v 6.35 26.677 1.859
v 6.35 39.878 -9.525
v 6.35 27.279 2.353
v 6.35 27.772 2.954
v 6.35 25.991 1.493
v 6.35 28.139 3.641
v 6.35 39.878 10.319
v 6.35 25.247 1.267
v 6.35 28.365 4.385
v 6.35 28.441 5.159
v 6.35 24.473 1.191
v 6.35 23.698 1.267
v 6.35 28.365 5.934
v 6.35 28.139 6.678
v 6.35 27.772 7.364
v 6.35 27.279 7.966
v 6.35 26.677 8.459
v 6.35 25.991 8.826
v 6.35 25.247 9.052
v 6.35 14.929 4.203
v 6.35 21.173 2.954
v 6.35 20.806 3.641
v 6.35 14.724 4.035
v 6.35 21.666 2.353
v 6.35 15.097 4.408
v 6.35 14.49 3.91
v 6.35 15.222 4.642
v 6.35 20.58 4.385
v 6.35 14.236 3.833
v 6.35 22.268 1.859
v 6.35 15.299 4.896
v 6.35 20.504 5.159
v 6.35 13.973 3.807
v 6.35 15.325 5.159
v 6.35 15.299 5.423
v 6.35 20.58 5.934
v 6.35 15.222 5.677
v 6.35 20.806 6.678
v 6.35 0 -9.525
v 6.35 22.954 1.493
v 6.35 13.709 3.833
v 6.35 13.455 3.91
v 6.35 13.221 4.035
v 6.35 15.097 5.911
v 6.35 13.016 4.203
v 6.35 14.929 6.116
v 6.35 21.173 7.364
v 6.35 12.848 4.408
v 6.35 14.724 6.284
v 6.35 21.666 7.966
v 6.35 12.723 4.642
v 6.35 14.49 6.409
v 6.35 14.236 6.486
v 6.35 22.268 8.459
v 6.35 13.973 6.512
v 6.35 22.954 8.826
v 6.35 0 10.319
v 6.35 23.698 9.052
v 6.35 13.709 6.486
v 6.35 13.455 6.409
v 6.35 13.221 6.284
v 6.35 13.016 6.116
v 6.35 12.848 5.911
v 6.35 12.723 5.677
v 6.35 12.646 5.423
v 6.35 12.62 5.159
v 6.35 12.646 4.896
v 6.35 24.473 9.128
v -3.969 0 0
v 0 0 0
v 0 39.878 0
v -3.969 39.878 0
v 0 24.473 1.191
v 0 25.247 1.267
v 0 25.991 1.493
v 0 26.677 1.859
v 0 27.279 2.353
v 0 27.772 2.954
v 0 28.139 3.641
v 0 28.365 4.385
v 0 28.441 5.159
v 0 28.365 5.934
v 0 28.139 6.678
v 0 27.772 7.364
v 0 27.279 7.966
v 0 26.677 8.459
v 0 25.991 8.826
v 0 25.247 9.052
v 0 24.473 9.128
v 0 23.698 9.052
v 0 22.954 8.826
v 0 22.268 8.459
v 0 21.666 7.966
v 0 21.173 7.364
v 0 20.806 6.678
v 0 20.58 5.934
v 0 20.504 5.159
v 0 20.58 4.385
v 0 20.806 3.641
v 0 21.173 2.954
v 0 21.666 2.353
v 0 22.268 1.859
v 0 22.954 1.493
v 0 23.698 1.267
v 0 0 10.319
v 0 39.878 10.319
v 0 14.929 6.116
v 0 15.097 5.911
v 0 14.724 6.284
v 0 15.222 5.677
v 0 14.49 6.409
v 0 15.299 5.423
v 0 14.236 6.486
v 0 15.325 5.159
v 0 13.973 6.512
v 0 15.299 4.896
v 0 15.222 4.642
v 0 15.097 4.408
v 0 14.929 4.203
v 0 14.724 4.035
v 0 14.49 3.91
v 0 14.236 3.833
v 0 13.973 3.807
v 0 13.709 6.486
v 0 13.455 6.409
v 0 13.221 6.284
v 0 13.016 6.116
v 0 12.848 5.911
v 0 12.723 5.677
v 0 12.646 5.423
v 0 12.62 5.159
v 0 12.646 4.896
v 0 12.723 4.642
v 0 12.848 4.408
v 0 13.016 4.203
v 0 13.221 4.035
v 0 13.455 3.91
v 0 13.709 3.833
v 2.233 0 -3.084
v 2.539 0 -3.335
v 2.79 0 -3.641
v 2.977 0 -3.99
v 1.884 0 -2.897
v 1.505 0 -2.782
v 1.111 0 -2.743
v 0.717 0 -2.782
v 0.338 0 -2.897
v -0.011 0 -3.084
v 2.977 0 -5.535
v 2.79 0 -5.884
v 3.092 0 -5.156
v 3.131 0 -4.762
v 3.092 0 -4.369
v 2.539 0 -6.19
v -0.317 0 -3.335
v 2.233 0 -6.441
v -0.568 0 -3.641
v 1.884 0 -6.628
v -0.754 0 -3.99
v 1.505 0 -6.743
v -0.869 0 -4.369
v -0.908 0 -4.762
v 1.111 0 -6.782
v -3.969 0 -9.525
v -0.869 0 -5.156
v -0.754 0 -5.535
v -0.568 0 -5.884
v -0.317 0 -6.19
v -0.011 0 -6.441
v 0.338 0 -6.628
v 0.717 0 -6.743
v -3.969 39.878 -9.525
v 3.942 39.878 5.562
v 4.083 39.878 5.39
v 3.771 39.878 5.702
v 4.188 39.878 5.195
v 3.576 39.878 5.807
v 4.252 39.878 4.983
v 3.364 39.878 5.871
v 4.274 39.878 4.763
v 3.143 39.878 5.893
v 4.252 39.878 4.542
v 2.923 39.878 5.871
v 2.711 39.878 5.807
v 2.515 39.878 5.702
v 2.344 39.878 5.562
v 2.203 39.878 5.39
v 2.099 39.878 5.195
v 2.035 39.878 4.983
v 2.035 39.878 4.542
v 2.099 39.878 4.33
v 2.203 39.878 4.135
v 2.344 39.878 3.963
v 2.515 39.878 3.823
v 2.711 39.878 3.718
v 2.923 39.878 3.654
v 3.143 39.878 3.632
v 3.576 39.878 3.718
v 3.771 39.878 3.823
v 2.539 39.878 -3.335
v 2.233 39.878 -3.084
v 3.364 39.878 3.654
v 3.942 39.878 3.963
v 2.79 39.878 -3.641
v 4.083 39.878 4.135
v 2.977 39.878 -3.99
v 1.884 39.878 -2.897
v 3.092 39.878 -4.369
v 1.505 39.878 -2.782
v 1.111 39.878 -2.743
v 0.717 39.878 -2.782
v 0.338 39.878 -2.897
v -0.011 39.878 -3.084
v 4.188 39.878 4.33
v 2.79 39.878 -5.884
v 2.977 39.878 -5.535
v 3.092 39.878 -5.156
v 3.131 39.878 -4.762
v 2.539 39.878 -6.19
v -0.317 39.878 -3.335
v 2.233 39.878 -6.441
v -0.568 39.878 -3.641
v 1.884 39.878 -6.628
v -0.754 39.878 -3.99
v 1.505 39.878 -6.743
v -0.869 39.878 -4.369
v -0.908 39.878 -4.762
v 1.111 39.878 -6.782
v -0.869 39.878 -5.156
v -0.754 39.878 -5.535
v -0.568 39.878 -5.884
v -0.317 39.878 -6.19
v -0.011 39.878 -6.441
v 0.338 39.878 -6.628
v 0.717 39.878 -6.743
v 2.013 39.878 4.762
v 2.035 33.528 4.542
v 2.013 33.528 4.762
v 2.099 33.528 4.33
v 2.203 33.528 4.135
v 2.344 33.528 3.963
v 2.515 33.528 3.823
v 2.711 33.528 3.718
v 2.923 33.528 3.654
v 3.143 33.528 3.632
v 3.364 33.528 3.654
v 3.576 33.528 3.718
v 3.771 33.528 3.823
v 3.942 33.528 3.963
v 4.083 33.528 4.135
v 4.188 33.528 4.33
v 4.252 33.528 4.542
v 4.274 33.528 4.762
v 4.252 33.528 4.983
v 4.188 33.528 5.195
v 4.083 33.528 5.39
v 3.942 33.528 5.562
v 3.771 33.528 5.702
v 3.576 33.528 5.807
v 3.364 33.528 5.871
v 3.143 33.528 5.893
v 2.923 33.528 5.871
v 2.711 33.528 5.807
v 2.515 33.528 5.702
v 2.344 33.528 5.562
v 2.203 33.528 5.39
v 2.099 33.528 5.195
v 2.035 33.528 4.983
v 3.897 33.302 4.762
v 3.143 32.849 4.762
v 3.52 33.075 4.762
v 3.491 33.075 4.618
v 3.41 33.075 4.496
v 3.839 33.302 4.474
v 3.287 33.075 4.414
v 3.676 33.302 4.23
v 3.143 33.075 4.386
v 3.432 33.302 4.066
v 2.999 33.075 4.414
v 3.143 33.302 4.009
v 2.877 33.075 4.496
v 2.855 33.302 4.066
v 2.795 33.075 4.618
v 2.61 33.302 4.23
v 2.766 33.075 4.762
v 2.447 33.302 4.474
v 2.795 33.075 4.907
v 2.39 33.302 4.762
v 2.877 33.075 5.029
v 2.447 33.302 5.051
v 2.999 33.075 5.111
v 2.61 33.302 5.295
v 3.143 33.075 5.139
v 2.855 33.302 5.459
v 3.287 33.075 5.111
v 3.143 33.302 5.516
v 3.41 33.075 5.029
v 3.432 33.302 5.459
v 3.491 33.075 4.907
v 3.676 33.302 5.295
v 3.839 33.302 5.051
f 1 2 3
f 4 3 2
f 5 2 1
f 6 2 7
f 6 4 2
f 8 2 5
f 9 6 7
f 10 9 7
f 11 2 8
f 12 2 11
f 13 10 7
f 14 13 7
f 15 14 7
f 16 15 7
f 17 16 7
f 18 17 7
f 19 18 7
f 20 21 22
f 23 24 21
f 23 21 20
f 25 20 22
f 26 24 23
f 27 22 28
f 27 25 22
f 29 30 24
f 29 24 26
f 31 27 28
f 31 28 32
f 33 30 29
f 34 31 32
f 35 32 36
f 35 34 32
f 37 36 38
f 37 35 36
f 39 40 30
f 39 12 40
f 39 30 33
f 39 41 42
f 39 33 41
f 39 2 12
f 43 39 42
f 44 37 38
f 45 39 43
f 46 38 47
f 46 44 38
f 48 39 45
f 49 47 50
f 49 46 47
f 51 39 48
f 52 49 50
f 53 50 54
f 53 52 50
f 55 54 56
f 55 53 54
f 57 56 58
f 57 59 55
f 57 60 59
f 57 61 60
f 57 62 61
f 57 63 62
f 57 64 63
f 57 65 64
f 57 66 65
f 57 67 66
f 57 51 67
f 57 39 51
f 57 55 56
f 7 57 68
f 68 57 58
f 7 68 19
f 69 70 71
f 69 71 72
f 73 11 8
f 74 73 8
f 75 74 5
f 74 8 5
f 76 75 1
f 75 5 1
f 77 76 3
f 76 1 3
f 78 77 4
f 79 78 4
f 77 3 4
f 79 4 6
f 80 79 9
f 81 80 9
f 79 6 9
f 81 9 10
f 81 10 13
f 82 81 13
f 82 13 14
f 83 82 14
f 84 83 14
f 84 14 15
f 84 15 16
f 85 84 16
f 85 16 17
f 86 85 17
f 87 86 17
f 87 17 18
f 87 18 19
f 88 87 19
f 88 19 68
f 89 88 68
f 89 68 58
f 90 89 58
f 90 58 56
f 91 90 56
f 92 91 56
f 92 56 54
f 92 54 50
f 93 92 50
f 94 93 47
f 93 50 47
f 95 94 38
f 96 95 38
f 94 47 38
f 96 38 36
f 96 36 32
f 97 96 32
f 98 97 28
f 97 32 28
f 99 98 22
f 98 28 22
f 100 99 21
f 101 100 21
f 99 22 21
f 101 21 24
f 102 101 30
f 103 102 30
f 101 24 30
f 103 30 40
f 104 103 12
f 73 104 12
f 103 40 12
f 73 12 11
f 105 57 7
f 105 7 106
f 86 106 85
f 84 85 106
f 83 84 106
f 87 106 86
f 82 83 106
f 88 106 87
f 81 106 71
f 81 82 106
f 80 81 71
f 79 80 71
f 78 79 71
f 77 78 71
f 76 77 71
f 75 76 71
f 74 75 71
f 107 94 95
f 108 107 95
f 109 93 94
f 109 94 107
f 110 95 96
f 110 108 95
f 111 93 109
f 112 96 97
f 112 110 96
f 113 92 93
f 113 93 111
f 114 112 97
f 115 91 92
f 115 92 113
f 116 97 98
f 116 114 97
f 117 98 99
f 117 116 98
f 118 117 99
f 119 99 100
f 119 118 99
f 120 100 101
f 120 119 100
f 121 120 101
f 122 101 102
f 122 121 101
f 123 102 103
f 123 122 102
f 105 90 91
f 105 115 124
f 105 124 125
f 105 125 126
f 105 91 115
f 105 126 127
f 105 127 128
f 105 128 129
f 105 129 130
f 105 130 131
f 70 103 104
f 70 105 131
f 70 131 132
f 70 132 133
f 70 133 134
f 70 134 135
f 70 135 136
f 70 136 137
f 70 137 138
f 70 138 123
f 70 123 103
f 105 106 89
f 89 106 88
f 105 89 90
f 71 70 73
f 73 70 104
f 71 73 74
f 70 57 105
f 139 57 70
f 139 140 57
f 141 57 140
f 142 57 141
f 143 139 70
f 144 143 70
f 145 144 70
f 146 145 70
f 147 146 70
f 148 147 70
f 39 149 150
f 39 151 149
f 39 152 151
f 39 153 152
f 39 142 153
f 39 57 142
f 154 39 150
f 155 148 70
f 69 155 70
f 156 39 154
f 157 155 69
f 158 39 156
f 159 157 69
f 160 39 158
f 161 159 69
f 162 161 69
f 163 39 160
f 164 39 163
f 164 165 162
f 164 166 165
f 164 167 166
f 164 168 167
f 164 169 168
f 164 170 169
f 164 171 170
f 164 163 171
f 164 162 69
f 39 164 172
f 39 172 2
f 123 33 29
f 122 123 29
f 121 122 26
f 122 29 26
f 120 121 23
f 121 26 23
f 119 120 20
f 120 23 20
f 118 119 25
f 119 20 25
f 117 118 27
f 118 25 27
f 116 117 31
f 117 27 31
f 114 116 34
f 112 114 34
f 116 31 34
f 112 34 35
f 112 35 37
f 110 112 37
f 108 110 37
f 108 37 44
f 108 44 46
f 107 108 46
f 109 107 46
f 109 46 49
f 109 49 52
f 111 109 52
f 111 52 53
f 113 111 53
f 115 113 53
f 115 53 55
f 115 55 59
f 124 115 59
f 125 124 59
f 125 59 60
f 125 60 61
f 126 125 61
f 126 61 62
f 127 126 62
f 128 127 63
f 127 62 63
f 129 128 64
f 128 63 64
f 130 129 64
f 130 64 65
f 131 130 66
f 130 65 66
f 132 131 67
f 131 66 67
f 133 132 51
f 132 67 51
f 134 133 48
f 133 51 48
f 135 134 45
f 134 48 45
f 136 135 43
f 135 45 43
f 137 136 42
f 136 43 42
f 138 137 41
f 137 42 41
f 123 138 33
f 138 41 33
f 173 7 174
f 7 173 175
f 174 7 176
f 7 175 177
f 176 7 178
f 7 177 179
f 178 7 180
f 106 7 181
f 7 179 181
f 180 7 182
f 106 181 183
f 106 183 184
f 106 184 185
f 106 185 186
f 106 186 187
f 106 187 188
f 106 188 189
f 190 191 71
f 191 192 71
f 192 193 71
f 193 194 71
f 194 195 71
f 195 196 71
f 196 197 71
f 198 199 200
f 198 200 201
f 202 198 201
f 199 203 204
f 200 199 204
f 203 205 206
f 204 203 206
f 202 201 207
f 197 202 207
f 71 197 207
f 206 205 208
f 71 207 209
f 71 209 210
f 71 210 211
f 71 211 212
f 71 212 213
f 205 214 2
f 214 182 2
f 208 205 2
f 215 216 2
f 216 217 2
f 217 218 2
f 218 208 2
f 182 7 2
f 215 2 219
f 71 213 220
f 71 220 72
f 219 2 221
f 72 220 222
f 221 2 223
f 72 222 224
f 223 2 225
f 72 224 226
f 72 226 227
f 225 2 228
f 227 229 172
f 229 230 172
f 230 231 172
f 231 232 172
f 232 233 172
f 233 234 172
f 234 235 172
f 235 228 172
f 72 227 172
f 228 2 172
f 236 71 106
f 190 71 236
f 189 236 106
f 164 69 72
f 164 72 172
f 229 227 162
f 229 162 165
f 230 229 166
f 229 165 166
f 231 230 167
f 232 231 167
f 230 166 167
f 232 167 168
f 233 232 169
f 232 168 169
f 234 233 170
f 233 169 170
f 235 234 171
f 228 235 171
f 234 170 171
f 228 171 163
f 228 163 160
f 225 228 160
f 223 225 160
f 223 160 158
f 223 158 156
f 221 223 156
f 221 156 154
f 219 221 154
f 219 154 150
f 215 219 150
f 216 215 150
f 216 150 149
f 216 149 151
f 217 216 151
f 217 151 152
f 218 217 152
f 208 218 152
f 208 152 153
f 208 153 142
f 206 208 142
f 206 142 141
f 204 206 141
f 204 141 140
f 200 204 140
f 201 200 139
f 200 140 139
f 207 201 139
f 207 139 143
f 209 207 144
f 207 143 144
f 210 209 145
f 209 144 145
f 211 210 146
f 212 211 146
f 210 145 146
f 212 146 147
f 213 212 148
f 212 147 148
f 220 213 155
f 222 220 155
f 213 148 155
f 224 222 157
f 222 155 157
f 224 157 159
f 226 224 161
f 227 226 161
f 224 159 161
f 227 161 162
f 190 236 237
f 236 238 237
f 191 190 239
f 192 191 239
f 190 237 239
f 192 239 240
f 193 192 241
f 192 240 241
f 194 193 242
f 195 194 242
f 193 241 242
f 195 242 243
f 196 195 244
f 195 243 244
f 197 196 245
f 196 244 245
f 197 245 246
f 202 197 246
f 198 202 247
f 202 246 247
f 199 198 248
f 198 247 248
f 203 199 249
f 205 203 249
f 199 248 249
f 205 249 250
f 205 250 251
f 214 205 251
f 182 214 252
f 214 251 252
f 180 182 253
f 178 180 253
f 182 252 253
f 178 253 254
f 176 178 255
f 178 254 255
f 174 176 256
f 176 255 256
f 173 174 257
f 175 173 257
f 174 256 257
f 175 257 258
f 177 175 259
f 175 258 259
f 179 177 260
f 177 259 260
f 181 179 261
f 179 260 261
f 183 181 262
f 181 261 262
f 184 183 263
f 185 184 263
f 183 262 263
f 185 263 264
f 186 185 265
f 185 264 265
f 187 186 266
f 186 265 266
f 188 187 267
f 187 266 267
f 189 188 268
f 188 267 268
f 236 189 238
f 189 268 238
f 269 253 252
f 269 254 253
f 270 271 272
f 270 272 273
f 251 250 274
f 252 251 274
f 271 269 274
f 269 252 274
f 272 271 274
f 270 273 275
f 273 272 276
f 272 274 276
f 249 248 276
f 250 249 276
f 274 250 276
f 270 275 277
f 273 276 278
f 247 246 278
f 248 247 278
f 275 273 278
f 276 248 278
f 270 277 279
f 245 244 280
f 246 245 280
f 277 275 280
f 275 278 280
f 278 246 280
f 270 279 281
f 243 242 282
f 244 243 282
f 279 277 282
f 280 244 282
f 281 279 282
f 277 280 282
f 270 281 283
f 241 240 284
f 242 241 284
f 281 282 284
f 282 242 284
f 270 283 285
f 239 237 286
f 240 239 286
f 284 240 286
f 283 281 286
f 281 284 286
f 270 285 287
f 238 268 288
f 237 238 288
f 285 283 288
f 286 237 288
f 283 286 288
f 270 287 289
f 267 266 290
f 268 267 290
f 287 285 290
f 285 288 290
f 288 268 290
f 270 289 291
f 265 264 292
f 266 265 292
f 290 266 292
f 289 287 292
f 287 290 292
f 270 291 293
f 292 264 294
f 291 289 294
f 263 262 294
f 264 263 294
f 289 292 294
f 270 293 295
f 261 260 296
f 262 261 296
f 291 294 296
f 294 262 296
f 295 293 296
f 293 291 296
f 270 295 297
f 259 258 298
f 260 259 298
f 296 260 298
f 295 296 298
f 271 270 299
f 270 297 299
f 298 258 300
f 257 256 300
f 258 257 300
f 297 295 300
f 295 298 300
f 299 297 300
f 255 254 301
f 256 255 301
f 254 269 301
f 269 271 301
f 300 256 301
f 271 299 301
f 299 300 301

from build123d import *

# Parameters (mm, degrees)
BOSS_EXTRUDE1_DEPTH        = 39.878
F_10_32_TAPPED_HOLE1_D     = 4.0386
F_10_32_TAPPED_HOLE1_DEPTH = 39.878
F_6_32_TAPPED_HOLE1_D      = 2.7051
F_6_32_TAPPED_HOLE1_DEPTH  = 6.35
CUT_EXTRUDE1_REACH         = 12.319
SKETCH10_R                 = 3.96875
F_4_40_TAPPED_HOLE1_D      = 2.2606
F_4_40_TAPPED_HOLE1_DEPTH  = 6.35
F_4_40_TAPPED_HOLE1_TIP    = 0.679152758


with BuildPart() as part:
    # Sketch1 → Boss-Extrude1 (new body)
    with BuildSketch(Plane(origin=(0, 0, 0), x_dir=(1, 0, 0), z_dir=(0, 1, 0))):
        Polygon((0, 0), (-3.96875, 0), (-3.96875, 9.525), (6.35, 9.525), (6.35, -10.31875), (0, -10.31875), align=None)
    extrude(amount=BOSS_EXTRUDE1_DEPTH)

    # #10-32 Tapped Hole1
    with Locations(Plane(origin=(0, 39.878, 0), x_dir=(1, 0, 0), z_dir=(0, 1, 0))):
        with Locations((1.11125, 4.7625)):
            Hole(F_10_32_TAPPED_HOLE1_D / 2, depth=F_10_32_TAPPED_HOLE1_DEPTH)

    # #6-32 Tapped Hole1
    with Locations(Plane.ZY):
        with Locations((5.159375, 13.97254)):
            Hole(F_6_32_TAPPED_HOLE1_D / 2, depth=F_6_32_TAPPED_HOLE1_DEPTH)

    # Sketch10 → Cut-Extrude1 (cut, up to next)
    with BuildSketch(Plane(origin=(6.35, 0, 0), x_dir=(0, 0, -1), z_dir=(1, 0, 0)), mode=Mode.PRIVATE) as cut_extrude1_sk1:
        with Locations((-5.159375, 24.47254)):
            Circle(SKETCH10_R)
    cut_extrude1_tool1 = extrude(cut_extrude1_sk1.sketch, amount=-CUT_EXTRUDE1_REACH, mode=Mode.PRIVATE) & part.part
    add(cut_extrude1_tool1.solids().sort_by_distance((6.35, 24.47254, 5.159375))[0], mode=Mode.SUBTRACT)

    # #4-40 Tapped Hole1
    with Locations(Plane(origin=(0, 39.878, 0), x_dir=(1, 0, 0), z_dir=(0, 1, 0))):
        with Locations((3.14325, -4.7625)):
            Hole(F_4_40_TAPPED_HOLE1_D / 2, depth=F_4_40_TAPPED_HOLE1_DEPTH)
            with Locations((0, 0, -(F_4_40_TAPPED_HOLE1_DEPTH + F_4_40_TAPPED_HOLE1_TIP / 2))):  # 118° drill point
                Cone(0, F_4_40_TAPPED_HOLE1_D / 2, F_4_40_TAPPED_HOLE1_TIP, mode=Mode.SUBTRACT)


solid = part.part
